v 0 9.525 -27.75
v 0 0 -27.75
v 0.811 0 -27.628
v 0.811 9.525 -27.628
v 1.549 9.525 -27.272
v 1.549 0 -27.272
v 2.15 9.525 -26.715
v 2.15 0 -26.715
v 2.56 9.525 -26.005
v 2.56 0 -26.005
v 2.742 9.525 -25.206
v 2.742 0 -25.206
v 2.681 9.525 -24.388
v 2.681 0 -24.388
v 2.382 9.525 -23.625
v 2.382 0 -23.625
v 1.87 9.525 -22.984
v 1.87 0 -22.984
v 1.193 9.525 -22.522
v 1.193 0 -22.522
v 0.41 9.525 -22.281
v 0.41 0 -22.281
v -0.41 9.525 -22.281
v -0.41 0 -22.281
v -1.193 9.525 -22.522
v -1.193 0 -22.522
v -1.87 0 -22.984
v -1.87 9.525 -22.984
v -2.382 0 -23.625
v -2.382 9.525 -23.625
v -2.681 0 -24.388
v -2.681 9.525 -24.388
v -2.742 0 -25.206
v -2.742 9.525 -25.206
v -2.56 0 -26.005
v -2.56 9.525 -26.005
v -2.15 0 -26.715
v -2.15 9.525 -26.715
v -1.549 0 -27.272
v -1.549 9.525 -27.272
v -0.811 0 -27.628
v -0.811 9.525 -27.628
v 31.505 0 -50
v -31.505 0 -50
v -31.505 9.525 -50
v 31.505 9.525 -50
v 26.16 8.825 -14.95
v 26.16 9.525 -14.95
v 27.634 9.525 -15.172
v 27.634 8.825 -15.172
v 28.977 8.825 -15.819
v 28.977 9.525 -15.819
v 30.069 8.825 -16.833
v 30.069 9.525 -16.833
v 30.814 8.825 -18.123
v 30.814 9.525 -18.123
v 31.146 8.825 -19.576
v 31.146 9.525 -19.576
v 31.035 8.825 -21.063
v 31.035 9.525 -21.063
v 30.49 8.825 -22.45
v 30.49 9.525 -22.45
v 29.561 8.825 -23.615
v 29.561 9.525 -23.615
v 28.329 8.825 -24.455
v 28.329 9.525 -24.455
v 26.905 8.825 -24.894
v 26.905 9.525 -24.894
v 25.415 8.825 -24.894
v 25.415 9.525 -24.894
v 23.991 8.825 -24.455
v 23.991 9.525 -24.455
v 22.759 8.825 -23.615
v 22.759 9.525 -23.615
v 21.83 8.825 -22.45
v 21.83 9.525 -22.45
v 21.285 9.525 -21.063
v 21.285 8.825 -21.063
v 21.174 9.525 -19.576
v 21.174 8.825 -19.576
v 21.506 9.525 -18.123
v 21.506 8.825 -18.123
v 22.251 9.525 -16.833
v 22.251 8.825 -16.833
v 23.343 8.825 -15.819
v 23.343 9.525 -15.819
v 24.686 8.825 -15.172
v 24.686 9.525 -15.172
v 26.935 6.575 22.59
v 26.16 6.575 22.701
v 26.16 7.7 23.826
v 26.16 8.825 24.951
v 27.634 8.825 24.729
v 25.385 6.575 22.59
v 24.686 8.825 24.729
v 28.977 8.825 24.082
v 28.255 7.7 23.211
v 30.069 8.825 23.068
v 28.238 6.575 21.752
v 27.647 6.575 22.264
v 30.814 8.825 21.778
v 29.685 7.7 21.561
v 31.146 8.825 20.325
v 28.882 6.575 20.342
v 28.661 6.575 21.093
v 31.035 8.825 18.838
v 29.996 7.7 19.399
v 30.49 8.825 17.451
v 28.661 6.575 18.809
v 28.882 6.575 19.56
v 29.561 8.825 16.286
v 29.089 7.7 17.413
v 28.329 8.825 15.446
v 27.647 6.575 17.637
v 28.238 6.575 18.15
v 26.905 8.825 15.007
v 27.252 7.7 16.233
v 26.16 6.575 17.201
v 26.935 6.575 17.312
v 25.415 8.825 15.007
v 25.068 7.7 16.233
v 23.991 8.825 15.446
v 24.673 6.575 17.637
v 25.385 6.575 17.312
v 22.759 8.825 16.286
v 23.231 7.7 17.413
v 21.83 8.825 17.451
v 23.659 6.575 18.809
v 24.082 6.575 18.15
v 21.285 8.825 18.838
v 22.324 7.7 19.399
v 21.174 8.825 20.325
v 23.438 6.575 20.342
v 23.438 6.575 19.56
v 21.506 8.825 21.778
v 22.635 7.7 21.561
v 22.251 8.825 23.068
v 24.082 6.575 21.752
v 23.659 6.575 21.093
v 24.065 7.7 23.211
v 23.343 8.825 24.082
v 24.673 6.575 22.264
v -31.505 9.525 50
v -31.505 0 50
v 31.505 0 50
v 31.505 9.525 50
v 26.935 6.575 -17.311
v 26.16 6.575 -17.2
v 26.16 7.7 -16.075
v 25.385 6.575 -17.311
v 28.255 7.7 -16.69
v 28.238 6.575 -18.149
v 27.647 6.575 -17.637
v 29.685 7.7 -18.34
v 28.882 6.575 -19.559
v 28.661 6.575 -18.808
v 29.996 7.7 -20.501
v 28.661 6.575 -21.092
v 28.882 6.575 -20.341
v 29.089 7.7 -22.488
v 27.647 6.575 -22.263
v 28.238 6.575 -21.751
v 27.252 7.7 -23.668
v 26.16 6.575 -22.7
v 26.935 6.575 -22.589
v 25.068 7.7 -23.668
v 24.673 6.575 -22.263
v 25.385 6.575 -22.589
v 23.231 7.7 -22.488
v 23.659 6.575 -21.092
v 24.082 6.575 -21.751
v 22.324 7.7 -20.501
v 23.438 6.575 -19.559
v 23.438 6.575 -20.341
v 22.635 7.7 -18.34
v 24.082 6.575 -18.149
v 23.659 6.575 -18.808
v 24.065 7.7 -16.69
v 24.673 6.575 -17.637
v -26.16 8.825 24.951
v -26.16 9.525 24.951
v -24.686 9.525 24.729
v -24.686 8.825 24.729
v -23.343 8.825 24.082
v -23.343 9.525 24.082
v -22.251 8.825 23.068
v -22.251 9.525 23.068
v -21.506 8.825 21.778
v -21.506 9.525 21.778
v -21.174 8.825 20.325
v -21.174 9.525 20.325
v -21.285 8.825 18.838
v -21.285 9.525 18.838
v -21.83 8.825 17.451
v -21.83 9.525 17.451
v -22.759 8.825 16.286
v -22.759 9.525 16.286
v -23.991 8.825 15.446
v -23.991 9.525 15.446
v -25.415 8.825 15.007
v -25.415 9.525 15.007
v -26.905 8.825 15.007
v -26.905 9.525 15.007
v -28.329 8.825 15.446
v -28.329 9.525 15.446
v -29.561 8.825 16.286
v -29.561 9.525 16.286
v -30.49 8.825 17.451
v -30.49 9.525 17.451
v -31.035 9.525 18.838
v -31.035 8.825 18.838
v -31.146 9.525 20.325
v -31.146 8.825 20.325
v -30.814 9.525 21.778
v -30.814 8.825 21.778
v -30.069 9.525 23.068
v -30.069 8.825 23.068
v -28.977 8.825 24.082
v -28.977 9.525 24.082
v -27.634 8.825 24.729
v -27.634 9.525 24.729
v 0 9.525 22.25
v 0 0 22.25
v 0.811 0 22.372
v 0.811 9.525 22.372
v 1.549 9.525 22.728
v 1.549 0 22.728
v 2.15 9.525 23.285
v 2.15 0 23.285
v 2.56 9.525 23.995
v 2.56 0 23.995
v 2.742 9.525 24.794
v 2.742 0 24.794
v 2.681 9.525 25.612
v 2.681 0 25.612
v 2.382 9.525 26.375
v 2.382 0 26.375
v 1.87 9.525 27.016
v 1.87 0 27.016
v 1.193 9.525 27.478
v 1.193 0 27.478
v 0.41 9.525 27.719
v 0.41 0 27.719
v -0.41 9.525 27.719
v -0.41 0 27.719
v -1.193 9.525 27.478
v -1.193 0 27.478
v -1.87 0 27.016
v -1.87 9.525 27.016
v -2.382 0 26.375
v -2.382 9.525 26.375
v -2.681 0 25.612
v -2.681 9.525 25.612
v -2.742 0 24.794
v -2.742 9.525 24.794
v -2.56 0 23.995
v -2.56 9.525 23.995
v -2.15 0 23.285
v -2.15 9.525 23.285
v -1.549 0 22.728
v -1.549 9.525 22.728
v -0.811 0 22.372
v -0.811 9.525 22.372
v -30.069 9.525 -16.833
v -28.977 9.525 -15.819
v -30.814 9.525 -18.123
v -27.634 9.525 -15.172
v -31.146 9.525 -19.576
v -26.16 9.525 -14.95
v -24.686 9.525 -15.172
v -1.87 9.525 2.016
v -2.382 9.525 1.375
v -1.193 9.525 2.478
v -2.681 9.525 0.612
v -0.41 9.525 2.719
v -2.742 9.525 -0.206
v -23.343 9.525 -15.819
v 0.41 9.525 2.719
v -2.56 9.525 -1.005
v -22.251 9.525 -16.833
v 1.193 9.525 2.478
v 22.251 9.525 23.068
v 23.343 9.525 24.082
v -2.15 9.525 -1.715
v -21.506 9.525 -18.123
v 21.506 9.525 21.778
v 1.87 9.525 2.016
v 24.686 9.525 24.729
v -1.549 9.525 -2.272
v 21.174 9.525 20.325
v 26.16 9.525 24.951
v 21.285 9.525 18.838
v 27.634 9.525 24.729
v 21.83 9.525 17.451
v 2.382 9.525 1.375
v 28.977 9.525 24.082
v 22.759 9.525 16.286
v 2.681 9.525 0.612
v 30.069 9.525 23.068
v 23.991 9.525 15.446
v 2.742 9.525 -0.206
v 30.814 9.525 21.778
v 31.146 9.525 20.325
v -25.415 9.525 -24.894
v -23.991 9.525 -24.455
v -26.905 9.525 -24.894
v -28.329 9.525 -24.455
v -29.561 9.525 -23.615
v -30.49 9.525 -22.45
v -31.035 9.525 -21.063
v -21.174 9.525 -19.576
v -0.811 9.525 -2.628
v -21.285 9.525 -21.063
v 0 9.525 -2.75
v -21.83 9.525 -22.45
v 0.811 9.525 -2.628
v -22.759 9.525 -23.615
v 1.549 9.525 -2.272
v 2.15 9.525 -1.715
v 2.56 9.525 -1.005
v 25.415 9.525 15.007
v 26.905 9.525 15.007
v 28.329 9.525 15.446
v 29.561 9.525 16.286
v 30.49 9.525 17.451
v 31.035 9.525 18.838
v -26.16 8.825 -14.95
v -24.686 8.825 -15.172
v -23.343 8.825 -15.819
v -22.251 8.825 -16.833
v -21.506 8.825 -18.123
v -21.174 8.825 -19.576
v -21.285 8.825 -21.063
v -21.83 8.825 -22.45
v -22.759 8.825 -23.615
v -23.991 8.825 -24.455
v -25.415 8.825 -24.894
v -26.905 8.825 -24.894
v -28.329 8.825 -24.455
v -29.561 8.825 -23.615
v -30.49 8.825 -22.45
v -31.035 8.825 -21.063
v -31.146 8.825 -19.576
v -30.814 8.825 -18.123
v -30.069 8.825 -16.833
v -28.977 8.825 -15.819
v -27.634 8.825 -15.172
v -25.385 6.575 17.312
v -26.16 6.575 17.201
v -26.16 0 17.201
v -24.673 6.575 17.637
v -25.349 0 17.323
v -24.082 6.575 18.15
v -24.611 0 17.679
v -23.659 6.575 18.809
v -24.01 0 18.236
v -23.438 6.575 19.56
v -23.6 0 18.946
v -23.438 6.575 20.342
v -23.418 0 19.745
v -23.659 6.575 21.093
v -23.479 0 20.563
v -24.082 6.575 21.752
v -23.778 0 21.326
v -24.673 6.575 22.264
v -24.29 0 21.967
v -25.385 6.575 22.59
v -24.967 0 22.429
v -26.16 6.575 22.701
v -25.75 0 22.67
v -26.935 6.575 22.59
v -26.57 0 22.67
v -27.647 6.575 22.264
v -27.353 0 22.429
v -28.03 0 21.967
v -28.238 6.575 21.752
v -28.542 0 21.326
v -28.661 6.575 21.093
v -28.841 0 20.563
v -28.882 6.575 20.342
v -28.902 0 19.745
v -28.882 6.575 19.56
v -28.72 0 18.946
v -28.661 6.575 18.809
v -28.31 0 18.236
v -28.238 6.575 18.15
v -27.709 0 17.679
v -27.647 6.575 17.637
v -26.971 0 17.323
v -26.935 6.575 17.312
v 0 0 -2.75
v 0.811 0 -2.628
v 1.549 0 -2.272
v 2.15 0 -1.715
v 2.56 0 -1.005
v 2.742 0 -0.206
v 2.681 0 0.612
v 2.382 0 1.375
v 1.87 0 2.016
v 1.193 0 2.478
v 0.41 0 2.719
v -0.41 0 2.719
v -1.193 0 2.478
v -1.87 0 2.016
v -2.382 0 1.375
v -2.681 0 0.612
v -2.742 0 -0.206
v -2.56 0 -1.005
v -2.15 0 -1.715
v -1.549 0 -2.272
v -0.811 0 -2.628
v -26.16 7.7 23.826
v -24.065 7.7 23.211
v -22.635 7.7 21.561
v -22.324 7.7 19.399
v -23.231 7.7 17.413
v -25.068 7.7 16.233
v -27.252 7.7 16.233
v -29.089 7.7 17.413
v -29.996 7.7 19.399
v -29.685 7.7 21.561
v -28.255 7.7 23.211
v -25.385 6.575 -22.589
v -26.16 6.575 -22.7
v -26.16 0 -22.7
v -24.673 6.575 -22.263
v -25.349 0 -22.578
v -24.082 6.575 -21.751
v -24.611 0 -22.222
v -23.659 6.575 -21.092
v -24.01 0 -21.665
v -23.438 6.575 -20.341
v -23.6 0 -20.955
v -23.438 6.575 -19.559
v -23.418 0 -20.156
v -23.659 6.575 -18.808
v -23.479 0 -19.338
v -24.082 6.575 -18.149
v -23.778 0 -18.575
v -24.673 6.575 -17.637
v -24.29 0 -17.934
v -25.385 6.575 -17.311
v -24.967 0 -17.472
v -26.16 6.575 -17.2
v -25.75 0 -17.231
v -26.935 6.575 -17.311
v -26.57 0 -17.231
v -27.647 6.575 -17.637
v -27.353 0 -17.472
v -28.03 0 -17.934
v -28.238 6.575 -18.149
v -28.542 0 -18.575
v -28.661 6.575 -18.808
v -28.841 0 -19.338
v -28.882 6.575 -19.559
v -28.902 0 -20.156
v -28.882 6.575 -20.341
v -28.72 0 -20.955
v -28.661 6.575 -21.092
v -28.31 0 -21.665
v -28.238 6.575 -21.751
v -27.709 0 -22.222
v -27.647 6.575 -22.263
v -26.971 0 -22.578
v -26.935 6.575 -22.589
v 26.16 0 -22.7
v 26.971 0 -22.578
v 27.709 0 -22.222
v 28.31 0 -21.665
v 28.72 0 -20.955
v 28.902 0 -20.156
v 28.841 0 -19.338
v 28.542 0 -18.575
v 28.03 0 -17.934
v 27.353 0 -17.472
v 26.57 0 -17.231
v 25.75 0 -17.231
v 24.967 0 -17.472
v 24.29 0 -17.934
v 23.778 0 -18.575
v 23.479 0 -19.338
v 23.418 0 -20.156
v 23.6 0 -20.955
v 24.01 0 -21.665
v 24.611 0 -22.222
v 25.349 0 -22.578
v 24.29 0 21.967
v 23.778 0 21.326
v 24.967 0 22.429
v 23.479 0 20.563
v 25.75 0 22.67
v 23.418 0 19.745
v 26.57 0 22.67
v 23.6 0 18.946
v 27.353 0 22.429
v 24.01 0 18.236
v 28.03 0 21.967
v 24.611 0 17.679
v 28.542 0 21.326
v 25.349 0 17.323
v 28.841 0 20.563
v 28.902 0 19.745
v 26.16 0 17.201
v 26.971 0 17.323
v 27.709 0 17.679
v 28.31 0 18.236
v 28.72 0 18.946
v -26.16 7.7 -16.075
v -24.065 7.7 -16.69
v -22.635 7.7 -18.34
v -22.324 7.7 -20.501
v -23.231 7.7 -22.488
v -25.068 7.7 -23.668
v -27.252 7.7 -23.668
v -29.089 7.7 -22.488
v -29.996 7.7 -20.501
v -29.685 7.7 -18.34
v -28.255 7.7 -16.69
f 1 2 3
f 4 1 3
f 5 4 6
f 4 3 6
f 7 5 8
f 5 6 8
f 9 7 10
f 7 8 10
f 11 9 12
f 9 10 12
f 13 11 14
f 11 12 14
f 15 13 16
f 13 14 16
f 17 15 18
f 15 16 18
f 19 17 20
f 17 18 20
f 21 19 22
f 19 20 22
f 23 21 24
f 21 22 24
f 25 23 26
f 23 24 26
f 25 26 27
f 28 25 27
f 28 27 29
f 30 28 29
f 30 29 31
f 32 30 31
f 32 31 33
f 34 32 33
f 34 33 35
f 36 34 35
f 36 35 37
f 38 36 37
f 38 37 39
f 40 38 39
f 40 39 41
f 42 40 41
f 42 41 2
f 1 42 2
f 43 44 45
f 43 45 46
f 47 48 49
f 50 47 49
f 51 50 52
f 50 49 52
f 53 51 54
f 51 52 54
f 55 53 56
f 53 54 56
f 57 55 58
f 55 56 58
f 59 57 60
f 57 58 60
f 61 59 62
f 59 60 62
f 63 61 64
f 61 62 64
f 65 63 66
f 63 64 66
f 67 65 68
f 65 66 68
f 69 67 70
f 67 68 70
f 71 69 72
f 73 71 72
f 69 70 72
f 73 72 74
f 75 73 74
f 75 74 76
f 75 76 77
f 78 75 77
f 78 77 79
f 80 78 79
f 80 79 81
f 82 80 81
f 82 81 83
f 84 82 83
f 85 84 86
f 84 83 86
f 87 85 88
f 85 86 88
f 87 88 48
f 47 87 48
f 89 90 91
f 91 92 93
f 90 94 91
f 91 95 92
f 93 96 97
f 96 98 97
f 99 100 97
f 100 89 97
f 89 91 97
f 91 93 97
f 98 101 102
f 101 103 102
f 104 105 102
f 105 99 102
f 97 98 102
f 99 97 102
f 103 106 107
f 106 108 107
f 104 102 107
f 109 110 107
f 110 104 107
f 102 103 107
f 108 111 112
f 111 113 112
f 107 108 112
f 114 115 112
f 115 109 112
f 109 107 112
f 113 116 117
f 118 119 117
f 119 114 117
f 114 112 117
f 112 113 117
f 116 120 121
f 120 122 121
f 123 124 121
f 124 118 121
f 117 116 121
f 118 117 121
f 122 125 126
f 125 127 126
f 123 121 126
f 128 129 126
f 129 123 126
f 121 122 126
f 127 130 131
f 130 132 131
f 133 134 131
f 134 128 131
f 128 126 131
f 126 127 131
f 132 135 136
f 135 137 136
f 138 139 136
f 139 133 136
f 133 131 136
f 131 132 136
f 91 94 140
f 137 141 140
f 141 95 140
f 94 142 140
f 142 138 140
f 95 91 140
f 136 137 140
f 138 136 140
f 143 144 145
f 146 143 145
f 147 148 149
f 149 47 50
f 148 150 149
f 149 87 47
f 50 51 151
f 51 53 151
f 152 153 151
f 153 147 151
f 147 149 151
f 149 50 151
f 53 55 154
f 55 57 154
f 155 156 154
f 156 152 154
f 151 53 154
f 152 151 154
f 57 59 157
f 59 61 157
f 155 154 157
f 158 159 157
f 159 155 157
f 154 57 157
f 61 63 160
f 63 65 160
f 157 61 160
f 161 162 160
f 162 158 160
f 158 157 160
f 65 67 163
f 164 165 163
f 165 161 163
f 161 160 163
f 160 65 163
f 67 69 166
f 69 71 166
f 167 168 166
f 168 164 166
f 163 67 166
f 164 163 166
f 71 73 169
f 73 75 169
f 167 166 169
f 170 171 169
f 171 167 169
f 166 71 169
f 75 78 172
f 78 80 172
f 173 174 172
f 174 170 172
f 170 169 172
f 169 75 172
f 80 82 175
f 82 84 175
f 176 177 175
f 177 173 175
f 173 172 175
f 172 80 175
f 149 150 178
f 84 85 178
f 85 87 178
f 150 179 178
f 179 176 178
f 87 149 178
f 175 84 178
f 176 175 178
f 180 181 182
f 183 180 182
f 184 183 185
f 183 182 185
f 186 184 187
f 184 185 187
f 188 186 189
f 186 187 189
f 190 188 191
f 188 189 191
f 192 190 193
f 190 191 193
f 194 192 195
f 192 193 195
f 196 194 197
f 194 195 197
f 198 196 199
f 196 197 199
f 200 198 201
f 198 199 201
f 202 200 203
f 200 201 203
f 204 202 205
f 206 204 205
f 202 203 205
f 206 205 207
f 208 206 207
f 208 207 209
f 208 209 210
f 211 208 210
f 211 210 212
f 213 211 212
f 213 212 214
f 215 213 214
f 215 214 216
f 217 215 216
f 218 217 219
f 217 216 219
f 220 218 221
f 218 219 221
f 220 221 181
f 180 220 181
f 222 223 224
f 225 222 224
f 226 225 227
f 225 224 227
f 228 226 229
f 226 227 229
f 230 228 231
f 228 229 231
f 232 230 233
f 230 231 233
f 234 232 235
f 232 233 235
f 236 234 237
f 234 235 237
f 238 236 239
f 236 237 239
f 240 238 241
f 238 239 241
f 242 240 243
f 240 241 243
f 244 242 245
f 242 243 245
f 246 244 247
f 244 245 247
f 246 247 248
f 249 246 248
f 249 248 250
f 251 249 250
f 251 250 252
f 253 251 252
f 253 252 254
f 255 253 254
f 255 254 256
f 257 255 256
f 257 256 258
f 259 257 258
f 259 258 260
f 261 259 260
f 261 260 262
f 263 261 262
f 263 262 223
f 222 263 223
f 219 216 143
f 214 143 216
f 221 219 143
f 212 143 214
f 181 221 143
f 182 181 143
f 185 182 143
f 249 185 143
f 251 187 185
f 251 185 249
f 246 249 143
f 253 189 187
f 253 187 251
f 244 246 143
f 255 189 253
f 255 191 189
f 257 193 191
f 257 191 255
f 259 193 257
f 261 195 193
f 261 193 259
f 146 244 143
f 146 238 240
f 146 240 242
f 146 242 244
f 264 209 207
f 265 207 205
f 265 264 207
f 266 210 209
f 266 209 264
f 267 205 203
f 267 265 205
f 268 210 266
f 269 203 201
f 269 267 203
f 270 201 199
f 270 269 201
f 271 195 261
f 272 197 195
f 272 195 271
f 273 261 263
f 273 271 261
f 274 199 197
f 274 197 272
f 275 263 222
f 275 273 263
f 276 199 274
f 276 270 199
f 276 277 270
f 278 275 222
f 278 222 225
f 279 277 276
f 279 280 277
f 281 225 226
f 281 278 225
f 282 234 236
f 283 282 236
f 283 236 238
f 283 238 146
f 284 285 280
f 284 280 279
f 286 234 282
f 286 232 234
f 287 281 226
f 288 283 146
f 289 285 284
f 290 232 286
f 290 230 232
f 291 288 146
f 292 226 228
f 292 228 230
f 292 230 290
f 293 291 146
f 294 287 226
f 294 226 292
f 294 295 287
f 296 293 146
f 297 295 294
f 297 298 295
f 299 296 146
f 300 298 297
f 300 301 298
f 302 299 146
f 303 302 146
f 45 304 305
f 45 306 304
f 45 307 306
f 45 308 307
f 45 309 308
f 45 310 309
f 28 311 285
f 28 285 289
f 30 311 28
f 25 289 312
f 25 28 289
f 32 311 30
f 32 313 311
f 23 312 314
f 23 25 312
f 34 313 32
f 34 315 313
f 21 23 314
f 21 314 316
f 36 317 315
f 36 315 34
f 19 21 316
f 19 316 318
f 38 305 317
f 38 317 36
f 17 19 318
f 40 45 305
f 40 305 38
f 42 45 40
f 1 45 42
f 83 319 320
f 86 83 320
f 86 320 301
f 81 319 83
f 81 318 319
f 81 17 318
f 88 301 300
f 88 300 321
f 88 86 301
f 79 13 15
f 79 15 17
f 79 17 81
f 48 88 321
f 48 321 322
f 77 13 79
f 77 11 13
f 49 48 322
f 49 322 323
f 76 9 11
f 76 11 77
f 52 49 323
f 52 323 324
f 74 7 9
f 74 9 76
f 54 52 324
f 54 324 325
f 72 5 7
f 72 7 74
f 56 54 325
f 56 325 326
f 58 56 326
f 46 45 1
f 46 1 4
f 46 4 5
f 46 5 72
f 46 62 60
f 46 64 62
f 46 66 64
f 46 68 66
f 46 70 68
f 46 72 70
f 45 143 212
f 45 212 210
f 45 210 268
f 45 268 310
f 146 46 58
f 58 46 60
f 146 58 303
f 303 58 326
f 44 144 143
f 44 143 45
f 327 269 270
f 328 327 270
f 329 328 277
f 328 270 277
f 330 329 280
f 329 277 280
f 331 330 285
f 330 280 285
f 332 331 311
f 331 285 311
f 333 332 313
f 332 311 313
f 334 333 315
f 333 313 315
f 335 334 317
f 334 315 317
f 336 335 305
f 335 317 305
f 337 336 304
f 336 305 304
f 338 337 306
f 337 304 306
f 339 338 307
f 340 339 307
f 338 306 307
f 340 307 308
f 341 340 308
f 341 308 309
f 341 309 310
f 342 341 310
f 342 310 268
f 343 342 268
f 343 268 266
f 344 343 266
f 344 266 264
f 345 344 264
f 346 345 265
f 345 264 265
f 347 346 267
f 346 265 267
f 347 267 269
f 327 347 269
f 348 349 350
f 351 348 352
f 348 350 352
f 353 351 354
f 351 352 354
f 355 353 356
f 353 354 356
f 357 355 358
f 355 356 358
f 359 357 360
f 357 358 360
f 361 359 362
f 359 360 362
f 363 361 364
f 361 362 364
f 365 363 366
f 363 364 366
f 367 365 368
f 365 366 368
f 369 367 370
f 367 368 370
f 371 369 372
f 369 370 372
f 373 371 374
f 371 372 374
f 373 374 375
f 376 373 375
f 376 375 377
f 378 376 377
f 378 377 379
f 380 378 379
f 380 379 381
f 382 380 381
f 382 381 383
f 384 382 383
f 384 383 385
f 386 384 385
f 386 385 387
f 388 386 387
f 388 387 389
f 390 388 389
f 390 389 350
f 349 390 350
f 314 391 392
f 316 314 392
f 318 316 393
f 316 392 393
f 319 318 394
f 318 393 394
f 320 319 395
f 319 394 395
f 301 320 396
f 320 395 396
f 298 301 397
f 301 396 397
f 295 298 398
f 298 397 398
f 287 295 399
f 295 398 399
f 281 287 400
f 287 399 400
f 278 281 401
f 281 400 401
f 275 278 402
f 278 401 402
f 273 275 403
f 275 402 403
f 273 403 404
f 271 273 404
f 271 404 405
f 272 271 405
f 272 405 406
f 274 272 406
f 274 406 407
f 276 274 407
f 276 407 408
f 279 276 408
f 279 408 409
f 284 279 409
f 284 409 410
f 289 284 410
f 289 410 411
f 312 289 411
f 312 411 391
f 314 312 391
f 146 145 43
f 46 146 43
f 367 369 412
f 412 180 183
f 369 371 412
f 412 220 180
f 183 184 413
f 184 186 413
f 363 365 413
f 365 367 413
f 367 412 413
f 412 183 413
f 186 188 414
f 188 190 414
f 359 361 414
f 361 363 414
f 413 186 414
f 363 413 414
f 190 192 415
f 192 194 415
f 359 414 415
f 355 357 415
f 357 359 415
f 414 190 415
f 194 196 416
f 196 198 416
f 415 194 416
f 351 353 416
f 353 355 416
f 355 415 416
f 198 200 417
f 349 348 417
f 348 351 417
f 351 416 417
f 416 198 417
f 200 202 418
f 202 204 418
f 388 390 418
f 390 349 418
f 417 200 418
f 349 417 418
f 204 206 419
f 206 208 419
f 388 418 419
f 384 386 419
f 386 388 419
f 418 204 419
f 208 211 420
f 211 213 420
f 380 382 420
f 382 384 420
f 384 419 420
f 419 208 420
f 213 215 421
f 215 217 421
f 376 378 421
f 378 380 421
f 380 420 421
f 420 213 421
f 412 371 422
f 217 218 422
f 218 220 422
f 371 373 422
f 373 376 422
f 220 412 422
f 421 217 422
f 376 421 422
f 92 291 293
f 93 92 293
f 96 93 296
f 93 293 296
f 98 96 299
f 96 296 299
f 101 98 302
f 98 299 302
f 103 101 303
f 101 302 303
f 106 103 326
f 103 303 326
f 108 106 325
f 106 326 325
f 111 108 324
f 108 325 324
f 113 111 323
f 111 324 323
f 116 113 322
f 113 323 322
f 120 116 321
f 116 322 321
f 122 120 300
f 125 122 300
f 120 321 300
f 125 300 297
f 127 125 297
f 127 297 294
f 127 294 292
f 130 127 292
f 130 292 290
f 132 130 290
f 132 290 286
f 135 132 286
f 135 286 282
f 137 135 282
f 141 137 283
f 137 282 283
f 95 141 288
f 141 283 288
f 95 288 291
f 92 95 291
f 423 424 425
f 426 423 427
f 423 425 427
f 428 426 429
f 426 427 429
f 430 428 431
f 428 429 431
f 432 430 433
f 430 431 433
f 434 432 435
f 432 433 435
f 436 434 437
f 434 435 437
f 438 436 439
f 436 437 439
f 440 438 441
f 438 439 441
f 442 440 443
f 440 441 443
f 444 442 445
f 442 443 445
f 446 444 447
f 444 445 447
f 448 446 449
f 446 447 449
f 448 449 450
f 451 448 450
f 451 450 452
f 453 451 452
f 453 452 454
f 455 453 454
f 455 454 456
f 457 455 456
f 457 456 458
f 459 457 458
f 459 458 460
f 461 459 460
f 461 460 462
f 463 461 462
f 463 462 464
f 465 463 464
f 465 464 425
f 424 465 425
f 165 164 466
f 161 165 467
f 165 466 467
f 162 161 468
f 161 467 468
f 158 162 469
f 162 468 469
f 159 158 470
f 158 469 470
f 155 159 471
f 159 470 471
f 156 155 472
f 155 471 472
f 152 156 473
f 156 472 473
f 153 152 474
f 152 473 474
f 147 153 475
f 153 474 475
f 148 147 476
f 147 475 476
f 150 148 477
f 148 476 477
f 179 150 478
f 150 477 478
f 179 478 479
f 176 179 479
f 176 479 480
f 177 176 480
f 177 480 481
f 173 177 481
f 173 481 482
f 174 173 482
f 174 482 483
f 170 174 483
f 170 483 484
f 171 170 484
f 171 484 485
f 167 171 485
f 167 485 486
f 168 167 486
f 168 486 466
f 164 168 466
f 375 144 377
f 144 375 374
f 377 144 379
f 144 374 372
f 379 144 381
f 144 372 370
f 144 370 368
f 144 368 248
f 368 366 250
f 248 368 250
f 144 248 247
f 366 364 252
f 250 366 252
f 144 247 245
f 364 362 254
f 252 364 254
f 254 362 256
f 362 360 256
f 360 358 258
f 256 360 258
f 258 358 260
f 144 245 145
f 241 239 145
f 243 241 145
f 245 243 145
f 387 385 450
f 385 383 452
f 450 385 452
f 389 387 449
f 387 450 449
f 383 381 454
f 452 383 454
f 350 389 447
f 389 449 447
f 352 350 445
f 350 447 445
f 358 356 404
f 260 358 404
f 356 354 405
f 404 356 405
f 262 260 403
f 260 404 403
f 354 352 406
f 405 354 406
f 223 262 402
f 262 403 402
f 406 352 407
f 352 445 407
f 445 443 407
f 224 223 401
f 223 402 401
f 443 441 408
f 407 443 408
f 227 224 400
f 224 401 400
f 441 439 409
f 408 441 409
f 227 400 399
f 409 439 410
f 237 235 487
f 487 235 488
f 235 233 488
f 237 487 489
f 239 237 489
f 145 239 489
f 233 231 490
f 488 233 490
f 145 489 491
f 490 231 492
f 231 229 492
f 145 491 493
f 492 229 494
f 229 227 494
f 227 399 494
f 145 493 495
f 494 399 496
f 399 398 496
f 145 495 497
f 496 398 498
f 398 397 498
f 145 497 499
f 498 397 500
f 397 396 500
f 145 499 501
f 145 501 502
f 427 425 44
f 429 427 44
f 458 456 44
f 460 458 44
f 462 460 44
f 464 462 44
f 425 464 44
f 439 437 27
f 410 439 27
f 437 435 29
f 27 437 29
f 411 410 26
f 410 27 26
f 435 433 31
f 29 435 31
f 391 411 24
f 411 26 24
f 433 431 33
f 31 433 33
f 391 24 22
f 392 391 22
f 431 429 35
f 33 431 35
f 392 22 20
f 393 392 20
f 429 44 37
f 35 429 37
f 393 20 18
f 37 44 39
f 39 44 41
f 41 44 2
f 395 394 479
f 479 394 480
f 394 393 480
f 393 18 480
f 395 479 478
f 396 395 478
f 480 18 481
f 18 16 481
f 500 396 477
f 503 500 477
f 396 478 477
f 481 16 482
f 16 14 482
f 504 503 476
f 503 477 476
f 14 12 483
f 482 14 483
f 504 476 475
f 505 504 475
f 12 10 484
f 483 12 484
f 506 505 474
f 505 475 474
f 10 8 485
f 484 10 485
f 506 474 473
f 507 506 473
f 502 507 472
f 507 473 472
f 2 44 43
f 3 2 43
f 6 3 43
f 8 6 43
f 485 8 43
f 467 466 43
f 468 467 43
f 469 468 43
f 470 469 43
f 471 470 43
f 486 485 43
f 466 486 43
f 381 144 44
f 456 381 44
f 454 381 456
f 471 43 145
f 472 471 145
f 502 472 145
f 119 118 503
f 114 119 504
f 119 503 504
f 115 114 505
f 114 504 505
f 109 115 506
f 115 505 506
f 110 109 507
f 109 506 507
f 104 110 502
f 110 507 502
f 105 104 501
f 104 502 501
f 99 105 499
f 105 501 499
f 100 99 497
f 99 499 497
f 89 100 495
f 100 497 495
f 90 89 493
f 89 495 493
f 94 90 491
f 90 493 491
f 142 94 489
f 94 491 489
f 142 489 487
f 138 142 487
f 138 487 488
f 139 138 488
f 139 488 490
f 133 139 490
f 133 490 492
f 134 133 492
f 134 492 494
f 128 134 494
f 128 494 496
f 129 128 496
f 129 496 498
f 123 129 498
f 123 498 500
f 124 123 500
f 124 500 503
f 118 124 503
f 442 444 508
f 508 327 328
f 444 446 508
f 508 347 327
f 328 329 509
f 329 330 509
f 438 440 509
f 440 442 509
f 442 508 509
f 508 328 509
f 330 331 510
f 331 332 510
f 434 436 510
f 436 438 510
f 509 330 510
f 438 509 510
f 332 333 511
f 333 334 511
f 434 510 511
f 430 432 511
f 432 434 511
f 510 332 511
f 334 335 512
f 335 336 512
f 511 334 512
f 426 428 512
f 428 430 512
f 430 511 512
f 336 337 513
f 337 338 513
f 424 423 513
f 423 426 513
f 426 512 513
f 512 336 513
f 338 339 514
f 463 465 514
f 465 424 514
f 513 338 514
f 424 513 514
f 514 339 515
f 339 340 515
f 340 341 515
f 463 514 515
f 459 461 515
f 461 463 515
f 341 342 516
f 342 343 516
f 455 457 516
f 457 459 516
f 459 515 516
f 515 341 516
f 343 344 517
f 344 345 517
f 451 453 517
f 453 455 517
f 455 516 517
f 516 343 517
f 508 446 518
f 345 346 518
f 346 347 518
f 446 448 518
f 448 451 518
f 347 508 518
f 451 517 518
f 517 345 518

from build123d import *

# Parameters (mm, degrees)
ESBO_O1_W                       = 63.01
ESBO_O1_H                       = 100
RESSALTO_EXTRUS_O1_DEPTH        = 9.525
ESBO_O2_R                       = 2.75
CORTE_EXTRUS_O1_DEPTH           = 10
ESBO_O3_R                       = 5
CORTE_EXTRUS_O2_DEPTH           = 0.7
ESBO_O4_R                       = 5
CORTE_EXTRUS_O3_DEPTH           = 2.5
CORTE_EXTRUS_O3_DRAFT           = -45
CORTE_EXTRUS_O3_PROFILE_2_DEPTH = 2.5
CORTE_EXTRUS_O3_PROFILE_2_DRAFT = -45
CORTE_EXTRUS_O3_PROFILE_3_DEPTH = 2.5
CORTE_EXTRUS_O3_PROFILE_3_DRAFT = -45
CORTE_EXTRUS_O3_PROFILE_4_DEPTH = 2.5
CORTE_EXTRUS_O3_PROFILE_4_DRAFT = -45


with BuildPart() as part:
    # Esboço1 → Ressalto-extrusão1 (new body)
    with BuildSketch(Plane(origin=(0, 0, 0), x_dir=(1, 0, 0), z_dir=(0, 1, 0))):
        Rectangle(ESBO_O1_W, ESBO_O1_H)
    extrude(amount=RESSALTO_EXTRUS_O1_DEPTH)

    # Esboço2 → Corte-extrusão1 (cut)
    with BuildSketch(Plane.XZ):
        with Locations(Location((-26.16, 19.950903247, 0), (0, 0, 270))):
            Circle(ESBO_O2_R)
        with Locations(Location((0, 25, 0), (0, 0, 270))):
            Circle(ESBO_O2_R)
        with Locations(Location((26.16, 19.950903247, 0), (0, 0, 270))):
            Circle(ESBO_O2_R)
        with Locations(Location((0, 0, 0), (0, 0, 270))):
            Circle(ESBO_O2_R)
        with Locations(Location((-26.16, -19.95, 0), (0, 0, 270))):
            Circle(ESBO_O2_R)
        with Locations(Location((0, -25, 0), (0, 0, 270))):
            Circle(ESBO_O2_R)
        with Locations(Location((26.16, -19.95, 0), (0, 0, 270))):
            Circle(ESBO_O2_R)
    extrude(amount=-CORTE_EXTRUS_O1_DEPTH, mode=Mode.SUBTRACT)

    # Esboço3 → Corte-extrusão2 (cut)
    with BuildSketch(Plane(origin=(0, 9.525, 0), x_dir=(1, 0, 0), z_dir=(0, 1, 0))):
        with Locations(Location((26.16, 19.95, 0), (0, 0, 270))):
            Circle(ESBO_O3_R)
        with Locations(Location((26.16, -19.950903247, 0), (0, 0, 270))):
            Circle(ESBO_O3_R)
        with Locations(Location((-26.16, -19.950903247, 0), (0, 0, 270))):
            Circle(ESBO_O3_R)
        with Locations(Location((-26.16, 19.95, 0), (0, 0, 270))):
            Circle(ESBO_O3_R)
    extrude(amount=-CORTE_EXTRUS_O2_DEPTH, mode=Mode.SUBTRACT)


with BuildPart() as corte_extrus_o3_tool:
    # Esboço4 → Corte-extrusão3 (with draft: the straight prism first)
    with BuildSketch(Plane(origin=(0, 8.825, 0), x_dir=(1, 0, 0), z_dir=(0, 1, 0))):
        with Locations(Location((26.16, 19.95, 0), (0, 0, 270))):
            Circle(ESBO_O4_R)
    extrude(amount=-CORTE_EXTRUS_O3_DEPTH)
    # Corte-extrusão3: the draft: its side faces are tilted about the plane it starts from
    corte_extrus_o3_sides = [corte_extrus_o3_tool.faces().sort_by_distance(p)[0] for p in [
        (26.16, 7.575, -24.95),
    ]]
    draft(corte_extrus_o3_sides, Plane(origin=(0, 8.825, 0), x_dir=(1, 0, 0), z_dir=(0, 1, 0)), CORTE_EXTRUS_O3_DRAFT)


with BuildPart() as part_1:
    add(part.part)

    # Corte-extrusão3: cut by corte_extrus_o3_tool
    add(corte_extrus_o3_tool.part, mode=Mode.SUBTRACT)


with BuildPart() as corte_extrus_o3_profile_2_tool:
    # Esboço4 → Corte-extrusão3 profile 2 (with draft: the straight prism first)
    with BuildSketch(Plane(origin=(0, 8.825, 0), x_dir=(1, 0, 0), z_dir=(0, 1, 0))):
        with Locations(Location((-26.16, 19.95, 0), (0, 0, 270))):
            Circle(ESBO_O4_R)
    extrude(amount=-CORTE_EXTRUS_O3_PROFILE_2_DEPTH)
    # Corte-extrusão3 profile 2: the draft: its side faces are tilted about the plane it starts from
    corte_extrus_o3_profile_2_sides = [corte_extrus_o3_profile_2_tool.faces().sort_by_distance(p)[0] for p in [
        (-26.16, 7.575, -24.95),
    ]]
    draft(corte_extrus_o3_profile_2_sides, Plane(origin=(0, 8.825, 0), x_dir=(1, 0, 0), z_dir=(0, 1, 0)), CORTE_EXTRUS_O3_PROFILE_2_DRAFT)


with BuildPart() as part_2:
    add(part_1.part)

    # Corte-extrusão3 profile 2: cut by corte_extrus_o3_profile_2_tool
    add(corte_extrus_o3_profile_2_tool.part, mode=Mode.SUBTRACT)


with BuildPart() as corte_extrus_o3_profile_3_tool:
    # Esboço4 → Corte-extrusão3 profile 3 (with draft: the straight prism first)
    with BuildSketch(Plane(origin=(0, 8.825, 0), x_dir=(1, 0, 0), z_dir=(0, 1, 0))):
        with Locations(Location((-26.16, -19.950903247, 0), (0, 0, 270))):
            Circle(ESBO_O4_R)
    extrude(amount=-CORTE_EXTRUS_O3_PROFILE_3_DEPTH)
    # Corte-extrusão3 profile 3: the draft: its side faces are tilted about the plane it starts from
    corte_extrus_o3_profile_3_sides = [corte_extrus_o3_profile_3_tool.faces().sort_by_distance(p)[0] for p in [
        (-26.16, 7.575, 14.950903247),
    ]]
    draft(corte_extrus_o3_profile_3_sides, Plane(origin=(0, 8.825, 0), x_dir=(1, 0, 0), z_dir=(0, 1, 0)), CORTE_EXTRUS_O3_PROFILE_3_DRAFT)


with BuildPart() as part_3:
    add(part_2.part)

    # Corte-extrusão3 profile 3: cut by corte_extrus_o3_profile_3_tool
    add(corte_extrus_o3_profile_3_tool.part, mode=Mode.SUBTRACT)


with BuildPart() as corte_extrus_o3_profile_4_tool:
    # Esboço4 → Corte-extrusão3 profile 4 (with draft: the straight prism first)
    with BuildSketch(Plane(origin=(0, 8.825, 0), x_dir=(1, 0, 0), z_dir=(0, 1, 0))):
        with Locations(Location((26.16, -19.950903247, 0), (0, 0, 270))):
            Circle(ESBO_O4_R)
    extrude(amount=-CORTE_EXTRUS_O3_PROFILE_4_DEPTH)
    # Corte-extrusão3 profile 4: the draft: its side faces are tilted about the plane it starts from
    corte_extrus_o3_profile_4_sides = [corte_extrus_o3_profile_4_tool.faces().sort_by_distance(p)[0] for p in [
        (26.16, 7.575, 14.950903247),
    ]]
    draft(corte_extrus_o3_profile_4_sides, Plane(origin=(0, 8.825, 0), x_dir=(1, 0, 0), z_dir=(0, 1, 0)), CORTE_EXTRUS_O3_PROFILE_4_DRAFT)


with BuildPart() as part_4:
    add(part_3.part)

    # Corte-extrusão3 profile 4: cut by corte_extrus_o3_profile_4_tool
    add(corte_extrus_o3_profile_4_tool.part, mode=Mode.SUBTRACT)


solid = part_4.part
